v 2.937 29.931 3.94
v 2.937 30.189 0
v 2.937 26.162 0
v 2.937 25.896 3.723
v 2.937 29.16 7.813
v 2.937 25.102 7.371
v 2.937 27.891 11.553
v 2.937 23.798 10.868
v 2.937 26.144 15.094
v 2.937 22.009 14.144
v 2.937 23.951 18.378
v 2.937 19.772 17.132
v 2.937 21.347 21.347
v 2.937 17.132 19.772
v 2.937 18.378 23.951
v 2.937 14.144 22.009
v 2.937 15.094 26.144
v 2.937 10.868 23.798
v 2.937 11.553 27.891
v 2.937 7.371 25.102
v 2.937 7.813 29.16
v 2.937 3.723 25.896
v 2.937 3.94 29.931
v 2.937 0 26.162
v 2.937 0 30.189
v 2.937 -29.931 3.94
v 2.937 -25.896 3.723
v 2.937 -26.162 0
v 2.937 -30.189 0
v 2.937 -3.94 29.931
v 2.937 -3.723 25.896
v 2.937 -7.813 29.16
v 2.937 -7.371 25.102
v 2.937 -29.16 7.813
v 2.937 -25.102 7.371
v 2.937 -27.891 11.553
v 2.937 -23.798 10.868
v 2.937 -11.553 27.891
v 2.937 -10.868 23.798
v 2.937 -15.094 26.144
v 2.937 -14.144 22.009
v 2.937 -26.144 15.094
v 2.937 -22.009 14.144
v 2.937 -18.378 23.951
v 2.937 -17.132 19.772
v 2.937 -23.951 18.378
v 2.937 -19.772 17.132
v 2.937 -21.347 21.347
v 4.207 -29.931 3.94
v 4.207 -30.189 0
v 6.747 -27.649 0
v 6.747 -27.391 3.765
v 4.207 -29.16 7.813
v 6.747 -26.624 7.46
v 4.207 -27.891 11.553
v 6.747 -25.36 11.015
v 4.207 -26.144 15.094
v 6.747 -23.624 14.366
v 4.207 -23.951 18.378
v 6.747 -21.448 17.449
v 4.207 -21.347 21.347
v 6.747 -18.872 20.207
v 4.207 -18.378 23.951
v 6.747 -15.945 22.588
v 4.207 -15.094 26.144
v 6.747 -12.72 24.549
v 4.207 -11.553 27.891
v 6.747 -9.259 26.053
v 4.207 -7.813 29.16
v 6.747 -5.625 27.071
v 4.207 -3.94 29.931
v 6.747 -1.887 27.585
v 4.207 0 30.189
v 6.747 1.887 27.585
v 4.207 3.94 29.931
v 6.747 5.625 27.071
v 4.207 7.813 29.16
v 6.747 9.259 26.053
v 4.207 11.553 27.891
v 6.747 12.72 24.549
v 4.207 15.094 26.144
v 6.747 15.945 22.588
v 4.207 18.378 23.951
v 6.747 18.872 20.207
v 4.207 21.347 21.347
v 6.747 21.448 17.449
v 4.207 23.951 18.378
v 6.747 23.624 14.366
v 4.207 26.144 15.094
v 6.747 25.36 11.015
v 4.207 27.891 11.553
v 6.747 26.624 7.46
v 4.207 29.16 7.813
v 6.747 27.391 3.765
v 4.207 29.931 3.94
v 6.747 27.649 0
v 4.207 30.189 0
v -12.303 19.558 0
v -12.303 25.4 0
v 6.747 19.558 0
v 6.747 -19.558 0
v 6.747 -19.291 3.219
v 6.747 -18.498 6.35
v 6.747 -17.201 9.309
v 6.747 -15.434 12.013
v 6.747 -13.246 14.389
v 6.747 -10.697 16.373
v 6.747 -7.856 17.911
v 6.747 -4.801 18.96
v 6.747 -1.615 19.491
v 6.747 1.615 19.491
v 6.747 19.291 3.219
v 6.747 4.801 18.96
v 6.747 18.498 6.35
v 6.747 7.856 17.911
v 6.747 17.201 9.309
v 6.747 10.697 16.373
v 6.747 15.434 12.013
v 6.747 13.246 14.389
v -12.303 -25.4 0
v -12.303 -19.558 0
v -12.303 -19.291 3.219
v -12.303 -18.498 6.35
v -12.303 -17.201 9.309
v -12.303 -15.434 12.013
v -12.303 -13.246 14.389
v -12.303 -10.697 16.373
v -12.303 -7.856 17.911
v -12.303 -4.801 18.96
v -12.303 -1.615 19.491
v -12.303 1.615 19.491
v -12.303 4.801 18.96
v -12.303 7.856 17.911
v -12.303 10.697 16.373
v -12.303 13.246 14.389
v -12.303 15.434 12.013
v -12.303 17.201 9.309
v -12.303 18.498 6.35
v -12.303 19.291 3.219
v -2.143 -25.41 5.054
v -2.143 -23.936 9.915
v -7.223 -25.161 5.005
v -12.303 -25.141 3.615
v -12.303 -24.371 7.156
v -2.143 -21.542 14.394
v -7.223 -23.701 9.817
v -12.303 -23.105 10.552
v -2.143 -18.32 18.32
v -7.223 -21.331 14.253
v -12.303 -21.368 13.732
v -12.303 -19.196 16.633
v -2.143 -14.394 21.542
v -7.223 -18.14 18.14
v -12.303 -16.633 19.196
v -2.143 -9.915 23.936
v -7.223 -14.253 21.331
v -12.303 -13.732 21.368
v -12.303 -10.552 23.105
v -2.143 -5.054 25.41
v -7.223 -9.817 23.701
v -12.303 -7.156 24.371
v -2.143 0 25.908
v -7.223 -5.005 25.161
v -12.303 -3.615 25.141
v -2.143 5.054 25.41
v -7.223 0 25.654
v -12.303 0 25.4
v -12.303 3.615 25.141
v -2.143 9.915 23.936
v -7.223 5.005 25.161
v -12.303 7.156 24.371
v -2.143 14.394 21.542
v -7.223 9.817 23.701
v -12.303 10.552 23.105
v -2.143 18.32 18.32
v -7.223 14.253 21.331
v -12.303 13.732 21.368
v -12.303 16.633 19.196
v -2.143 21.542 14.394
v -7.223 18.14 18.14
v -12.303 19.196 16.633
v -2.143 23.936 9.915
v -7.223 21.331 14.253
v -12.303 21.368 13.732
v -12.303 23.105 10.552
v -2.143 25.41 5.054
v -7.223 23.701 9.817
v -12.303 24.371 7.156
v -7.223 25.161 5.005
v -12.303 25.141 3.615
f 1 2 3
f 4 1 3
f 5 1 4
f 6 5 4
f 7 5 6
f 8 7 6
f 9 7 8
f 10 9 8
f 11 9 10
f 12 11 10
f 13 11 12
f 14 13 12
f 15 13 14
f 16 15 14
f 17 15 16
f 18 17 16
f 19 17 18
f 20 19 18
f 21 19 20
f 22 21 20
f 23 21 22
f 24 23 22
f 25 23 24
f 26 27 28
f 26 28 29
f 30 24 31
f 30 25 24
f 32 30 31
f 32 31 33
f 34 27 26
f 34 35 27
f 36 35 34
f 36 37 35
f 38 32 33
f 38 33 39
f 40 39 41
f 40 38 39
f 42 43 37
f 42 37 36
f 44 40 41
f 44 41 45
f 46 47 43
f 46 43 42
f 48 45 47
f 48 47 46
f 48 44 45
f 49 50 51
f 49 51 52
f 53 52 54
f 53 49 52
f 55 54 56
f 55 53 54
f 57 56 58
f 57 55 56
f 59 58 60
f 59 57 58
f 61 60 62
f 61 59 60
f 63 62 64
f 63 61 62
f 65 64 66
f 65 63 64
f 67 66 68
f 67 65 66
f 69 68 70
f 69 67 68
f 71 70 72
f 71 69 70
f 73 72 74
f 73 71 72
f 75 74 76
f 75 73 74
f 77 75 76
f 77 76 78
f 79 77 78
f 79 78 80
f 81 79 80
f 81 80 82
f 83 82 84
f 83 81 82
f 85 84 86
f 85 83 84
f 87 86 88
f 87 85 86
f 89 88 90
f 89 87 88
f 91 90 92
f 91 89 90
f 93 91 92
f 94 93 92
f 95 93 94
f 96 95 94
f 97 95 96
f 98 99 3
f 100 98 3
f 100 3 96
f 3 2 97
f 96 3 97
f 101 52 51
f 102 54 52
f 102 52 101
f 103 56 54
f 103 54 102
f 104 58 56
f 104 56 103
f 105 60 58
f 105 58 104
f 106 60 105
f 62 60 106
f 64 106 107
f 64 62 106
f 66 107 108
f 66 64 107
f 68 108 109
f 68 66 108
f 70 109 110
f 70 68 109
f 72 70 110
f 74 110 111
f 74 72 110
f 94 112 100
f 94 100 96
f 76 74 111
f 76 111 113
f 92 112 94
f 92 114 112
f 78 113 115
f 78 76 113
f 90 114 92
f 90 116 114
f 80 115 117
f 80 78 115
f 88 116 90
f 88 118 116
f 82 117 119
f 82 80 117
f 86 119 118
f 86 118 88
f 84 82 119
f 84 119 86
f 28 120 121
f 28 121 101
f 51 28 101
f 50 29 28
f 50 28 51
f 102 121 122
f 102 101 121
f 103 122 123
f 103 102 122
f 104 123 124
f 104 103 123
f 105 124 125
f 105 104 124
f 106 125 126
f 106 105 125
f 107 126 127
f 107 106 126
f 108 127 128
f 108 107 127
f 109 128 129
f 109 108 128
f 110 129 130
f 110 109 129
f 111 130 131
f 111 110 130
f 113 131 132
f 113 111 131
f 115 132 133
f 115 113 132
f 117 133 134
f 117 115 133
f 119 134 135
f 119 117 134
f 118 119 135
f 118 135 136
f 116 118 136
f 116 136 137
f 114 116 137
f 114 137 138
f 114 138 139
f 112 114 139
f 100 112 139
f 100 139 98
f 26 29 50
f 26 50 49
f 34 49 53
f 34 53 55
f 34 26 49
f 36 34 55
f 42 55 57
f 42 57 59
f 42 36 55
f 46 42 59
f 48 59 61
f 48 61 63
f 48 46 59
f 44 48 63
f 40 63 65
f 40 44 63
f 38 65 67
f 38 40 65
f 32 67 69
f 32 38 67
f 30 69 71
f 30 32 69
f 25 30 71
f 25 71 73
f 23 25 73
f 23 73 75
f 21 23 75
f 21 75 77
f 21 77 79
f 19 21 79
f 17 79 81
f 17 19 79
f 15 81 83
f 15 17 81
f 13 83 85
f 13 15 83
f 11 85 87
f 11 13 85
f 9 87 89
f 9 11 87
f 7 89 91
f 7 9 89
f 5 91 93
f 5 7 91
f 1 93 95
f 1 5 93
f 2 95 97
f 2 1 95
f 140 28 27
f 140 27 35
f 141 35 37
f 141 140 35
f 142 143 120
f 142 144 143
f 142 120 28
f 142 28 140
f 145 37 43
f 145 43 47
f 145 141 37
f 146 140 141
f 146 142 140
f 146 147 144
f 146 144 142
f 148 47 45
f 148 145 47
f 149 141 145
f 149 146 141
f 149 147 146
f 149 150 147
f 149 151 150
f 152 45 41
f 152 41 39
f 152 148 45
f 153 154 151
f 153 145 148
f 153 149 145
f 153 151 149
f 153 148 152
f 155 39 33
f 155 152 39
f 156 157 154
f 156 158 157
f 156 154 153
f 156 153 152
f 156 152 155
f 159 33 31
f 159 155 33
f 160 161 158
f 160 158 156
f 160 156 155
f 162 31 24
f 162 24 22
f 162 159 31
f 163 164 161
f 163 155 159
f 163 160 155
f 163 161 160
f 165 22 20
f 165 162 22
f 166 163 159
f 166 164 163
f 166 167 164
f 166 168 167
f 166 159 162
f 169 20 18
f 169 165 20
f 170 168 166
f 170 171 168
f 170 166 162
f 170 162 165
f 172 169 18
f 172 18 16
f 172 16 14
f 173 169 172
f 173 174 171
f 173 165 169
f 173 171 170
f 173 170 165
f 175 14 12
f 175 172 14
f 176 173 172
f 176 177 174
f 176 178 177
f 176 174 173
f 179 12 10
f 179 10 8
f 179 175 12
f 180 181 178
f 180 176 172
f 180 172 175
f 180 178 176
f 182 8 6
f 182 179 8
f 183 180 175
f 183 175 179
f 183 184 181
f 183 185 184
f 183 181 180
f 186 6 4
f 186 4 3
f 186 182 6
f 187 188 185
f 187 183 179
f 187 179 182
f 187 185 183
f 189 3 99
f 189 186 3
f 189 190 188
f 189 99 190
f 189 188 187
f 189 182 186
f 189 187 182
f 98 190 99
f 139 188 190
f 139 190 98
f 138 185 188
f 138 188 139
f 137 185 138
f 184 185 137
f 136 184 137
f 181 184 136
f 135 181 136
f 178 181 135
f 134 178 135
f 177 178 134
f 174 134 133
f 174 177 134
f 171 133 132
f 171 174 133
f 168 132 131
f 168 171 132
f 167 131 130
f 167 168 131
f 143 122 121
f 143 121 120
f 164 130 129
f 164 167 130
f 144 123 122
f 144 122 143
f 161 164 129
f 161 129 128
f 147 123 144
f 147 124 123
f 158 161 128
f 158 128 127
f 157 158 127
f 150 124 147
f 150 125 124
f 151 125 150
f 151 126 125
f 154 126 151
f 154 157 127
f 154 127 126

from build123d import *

# Parameters (mm, degrees)
F2_ANGLE_BACK = 90
F2_ANGLE      = 180
F3_SIZE       = 2.54


with BuildPart() as f2:
    # F0 (on Front) → F2 (revolve)
    with BuildSketch(Plane.XZ, mode=Mode.PRIVATE) as f2_sk:
        Polygon((2.9366673195, 26.162), (-12.3033326805, 25.4), (-12.3033326805, 19.558), (6.7466673195, 19.558), (6.7466673195, 30.1889932623), (2.9366673195, 30.1889932623), align=None)
    revolve(f2_sk.sketch.rotate(Axis((-24.6385950595, 0, 0), (-1, 0, 0)), -F2_ANGLE_BACK), axis=Axis((-24.6385950595, 0, 0), (-1, 0, 0)), revolution_arc=F2_ANGLE)

    # F3
    f3_edges = [f2.edges().sort_by_distance(p)[0] for p in [
        (6.746667, 0, 30.188993),
    ]]
    chamfer(f3_edges, length=F3_SIZE)


solid = f2.part
